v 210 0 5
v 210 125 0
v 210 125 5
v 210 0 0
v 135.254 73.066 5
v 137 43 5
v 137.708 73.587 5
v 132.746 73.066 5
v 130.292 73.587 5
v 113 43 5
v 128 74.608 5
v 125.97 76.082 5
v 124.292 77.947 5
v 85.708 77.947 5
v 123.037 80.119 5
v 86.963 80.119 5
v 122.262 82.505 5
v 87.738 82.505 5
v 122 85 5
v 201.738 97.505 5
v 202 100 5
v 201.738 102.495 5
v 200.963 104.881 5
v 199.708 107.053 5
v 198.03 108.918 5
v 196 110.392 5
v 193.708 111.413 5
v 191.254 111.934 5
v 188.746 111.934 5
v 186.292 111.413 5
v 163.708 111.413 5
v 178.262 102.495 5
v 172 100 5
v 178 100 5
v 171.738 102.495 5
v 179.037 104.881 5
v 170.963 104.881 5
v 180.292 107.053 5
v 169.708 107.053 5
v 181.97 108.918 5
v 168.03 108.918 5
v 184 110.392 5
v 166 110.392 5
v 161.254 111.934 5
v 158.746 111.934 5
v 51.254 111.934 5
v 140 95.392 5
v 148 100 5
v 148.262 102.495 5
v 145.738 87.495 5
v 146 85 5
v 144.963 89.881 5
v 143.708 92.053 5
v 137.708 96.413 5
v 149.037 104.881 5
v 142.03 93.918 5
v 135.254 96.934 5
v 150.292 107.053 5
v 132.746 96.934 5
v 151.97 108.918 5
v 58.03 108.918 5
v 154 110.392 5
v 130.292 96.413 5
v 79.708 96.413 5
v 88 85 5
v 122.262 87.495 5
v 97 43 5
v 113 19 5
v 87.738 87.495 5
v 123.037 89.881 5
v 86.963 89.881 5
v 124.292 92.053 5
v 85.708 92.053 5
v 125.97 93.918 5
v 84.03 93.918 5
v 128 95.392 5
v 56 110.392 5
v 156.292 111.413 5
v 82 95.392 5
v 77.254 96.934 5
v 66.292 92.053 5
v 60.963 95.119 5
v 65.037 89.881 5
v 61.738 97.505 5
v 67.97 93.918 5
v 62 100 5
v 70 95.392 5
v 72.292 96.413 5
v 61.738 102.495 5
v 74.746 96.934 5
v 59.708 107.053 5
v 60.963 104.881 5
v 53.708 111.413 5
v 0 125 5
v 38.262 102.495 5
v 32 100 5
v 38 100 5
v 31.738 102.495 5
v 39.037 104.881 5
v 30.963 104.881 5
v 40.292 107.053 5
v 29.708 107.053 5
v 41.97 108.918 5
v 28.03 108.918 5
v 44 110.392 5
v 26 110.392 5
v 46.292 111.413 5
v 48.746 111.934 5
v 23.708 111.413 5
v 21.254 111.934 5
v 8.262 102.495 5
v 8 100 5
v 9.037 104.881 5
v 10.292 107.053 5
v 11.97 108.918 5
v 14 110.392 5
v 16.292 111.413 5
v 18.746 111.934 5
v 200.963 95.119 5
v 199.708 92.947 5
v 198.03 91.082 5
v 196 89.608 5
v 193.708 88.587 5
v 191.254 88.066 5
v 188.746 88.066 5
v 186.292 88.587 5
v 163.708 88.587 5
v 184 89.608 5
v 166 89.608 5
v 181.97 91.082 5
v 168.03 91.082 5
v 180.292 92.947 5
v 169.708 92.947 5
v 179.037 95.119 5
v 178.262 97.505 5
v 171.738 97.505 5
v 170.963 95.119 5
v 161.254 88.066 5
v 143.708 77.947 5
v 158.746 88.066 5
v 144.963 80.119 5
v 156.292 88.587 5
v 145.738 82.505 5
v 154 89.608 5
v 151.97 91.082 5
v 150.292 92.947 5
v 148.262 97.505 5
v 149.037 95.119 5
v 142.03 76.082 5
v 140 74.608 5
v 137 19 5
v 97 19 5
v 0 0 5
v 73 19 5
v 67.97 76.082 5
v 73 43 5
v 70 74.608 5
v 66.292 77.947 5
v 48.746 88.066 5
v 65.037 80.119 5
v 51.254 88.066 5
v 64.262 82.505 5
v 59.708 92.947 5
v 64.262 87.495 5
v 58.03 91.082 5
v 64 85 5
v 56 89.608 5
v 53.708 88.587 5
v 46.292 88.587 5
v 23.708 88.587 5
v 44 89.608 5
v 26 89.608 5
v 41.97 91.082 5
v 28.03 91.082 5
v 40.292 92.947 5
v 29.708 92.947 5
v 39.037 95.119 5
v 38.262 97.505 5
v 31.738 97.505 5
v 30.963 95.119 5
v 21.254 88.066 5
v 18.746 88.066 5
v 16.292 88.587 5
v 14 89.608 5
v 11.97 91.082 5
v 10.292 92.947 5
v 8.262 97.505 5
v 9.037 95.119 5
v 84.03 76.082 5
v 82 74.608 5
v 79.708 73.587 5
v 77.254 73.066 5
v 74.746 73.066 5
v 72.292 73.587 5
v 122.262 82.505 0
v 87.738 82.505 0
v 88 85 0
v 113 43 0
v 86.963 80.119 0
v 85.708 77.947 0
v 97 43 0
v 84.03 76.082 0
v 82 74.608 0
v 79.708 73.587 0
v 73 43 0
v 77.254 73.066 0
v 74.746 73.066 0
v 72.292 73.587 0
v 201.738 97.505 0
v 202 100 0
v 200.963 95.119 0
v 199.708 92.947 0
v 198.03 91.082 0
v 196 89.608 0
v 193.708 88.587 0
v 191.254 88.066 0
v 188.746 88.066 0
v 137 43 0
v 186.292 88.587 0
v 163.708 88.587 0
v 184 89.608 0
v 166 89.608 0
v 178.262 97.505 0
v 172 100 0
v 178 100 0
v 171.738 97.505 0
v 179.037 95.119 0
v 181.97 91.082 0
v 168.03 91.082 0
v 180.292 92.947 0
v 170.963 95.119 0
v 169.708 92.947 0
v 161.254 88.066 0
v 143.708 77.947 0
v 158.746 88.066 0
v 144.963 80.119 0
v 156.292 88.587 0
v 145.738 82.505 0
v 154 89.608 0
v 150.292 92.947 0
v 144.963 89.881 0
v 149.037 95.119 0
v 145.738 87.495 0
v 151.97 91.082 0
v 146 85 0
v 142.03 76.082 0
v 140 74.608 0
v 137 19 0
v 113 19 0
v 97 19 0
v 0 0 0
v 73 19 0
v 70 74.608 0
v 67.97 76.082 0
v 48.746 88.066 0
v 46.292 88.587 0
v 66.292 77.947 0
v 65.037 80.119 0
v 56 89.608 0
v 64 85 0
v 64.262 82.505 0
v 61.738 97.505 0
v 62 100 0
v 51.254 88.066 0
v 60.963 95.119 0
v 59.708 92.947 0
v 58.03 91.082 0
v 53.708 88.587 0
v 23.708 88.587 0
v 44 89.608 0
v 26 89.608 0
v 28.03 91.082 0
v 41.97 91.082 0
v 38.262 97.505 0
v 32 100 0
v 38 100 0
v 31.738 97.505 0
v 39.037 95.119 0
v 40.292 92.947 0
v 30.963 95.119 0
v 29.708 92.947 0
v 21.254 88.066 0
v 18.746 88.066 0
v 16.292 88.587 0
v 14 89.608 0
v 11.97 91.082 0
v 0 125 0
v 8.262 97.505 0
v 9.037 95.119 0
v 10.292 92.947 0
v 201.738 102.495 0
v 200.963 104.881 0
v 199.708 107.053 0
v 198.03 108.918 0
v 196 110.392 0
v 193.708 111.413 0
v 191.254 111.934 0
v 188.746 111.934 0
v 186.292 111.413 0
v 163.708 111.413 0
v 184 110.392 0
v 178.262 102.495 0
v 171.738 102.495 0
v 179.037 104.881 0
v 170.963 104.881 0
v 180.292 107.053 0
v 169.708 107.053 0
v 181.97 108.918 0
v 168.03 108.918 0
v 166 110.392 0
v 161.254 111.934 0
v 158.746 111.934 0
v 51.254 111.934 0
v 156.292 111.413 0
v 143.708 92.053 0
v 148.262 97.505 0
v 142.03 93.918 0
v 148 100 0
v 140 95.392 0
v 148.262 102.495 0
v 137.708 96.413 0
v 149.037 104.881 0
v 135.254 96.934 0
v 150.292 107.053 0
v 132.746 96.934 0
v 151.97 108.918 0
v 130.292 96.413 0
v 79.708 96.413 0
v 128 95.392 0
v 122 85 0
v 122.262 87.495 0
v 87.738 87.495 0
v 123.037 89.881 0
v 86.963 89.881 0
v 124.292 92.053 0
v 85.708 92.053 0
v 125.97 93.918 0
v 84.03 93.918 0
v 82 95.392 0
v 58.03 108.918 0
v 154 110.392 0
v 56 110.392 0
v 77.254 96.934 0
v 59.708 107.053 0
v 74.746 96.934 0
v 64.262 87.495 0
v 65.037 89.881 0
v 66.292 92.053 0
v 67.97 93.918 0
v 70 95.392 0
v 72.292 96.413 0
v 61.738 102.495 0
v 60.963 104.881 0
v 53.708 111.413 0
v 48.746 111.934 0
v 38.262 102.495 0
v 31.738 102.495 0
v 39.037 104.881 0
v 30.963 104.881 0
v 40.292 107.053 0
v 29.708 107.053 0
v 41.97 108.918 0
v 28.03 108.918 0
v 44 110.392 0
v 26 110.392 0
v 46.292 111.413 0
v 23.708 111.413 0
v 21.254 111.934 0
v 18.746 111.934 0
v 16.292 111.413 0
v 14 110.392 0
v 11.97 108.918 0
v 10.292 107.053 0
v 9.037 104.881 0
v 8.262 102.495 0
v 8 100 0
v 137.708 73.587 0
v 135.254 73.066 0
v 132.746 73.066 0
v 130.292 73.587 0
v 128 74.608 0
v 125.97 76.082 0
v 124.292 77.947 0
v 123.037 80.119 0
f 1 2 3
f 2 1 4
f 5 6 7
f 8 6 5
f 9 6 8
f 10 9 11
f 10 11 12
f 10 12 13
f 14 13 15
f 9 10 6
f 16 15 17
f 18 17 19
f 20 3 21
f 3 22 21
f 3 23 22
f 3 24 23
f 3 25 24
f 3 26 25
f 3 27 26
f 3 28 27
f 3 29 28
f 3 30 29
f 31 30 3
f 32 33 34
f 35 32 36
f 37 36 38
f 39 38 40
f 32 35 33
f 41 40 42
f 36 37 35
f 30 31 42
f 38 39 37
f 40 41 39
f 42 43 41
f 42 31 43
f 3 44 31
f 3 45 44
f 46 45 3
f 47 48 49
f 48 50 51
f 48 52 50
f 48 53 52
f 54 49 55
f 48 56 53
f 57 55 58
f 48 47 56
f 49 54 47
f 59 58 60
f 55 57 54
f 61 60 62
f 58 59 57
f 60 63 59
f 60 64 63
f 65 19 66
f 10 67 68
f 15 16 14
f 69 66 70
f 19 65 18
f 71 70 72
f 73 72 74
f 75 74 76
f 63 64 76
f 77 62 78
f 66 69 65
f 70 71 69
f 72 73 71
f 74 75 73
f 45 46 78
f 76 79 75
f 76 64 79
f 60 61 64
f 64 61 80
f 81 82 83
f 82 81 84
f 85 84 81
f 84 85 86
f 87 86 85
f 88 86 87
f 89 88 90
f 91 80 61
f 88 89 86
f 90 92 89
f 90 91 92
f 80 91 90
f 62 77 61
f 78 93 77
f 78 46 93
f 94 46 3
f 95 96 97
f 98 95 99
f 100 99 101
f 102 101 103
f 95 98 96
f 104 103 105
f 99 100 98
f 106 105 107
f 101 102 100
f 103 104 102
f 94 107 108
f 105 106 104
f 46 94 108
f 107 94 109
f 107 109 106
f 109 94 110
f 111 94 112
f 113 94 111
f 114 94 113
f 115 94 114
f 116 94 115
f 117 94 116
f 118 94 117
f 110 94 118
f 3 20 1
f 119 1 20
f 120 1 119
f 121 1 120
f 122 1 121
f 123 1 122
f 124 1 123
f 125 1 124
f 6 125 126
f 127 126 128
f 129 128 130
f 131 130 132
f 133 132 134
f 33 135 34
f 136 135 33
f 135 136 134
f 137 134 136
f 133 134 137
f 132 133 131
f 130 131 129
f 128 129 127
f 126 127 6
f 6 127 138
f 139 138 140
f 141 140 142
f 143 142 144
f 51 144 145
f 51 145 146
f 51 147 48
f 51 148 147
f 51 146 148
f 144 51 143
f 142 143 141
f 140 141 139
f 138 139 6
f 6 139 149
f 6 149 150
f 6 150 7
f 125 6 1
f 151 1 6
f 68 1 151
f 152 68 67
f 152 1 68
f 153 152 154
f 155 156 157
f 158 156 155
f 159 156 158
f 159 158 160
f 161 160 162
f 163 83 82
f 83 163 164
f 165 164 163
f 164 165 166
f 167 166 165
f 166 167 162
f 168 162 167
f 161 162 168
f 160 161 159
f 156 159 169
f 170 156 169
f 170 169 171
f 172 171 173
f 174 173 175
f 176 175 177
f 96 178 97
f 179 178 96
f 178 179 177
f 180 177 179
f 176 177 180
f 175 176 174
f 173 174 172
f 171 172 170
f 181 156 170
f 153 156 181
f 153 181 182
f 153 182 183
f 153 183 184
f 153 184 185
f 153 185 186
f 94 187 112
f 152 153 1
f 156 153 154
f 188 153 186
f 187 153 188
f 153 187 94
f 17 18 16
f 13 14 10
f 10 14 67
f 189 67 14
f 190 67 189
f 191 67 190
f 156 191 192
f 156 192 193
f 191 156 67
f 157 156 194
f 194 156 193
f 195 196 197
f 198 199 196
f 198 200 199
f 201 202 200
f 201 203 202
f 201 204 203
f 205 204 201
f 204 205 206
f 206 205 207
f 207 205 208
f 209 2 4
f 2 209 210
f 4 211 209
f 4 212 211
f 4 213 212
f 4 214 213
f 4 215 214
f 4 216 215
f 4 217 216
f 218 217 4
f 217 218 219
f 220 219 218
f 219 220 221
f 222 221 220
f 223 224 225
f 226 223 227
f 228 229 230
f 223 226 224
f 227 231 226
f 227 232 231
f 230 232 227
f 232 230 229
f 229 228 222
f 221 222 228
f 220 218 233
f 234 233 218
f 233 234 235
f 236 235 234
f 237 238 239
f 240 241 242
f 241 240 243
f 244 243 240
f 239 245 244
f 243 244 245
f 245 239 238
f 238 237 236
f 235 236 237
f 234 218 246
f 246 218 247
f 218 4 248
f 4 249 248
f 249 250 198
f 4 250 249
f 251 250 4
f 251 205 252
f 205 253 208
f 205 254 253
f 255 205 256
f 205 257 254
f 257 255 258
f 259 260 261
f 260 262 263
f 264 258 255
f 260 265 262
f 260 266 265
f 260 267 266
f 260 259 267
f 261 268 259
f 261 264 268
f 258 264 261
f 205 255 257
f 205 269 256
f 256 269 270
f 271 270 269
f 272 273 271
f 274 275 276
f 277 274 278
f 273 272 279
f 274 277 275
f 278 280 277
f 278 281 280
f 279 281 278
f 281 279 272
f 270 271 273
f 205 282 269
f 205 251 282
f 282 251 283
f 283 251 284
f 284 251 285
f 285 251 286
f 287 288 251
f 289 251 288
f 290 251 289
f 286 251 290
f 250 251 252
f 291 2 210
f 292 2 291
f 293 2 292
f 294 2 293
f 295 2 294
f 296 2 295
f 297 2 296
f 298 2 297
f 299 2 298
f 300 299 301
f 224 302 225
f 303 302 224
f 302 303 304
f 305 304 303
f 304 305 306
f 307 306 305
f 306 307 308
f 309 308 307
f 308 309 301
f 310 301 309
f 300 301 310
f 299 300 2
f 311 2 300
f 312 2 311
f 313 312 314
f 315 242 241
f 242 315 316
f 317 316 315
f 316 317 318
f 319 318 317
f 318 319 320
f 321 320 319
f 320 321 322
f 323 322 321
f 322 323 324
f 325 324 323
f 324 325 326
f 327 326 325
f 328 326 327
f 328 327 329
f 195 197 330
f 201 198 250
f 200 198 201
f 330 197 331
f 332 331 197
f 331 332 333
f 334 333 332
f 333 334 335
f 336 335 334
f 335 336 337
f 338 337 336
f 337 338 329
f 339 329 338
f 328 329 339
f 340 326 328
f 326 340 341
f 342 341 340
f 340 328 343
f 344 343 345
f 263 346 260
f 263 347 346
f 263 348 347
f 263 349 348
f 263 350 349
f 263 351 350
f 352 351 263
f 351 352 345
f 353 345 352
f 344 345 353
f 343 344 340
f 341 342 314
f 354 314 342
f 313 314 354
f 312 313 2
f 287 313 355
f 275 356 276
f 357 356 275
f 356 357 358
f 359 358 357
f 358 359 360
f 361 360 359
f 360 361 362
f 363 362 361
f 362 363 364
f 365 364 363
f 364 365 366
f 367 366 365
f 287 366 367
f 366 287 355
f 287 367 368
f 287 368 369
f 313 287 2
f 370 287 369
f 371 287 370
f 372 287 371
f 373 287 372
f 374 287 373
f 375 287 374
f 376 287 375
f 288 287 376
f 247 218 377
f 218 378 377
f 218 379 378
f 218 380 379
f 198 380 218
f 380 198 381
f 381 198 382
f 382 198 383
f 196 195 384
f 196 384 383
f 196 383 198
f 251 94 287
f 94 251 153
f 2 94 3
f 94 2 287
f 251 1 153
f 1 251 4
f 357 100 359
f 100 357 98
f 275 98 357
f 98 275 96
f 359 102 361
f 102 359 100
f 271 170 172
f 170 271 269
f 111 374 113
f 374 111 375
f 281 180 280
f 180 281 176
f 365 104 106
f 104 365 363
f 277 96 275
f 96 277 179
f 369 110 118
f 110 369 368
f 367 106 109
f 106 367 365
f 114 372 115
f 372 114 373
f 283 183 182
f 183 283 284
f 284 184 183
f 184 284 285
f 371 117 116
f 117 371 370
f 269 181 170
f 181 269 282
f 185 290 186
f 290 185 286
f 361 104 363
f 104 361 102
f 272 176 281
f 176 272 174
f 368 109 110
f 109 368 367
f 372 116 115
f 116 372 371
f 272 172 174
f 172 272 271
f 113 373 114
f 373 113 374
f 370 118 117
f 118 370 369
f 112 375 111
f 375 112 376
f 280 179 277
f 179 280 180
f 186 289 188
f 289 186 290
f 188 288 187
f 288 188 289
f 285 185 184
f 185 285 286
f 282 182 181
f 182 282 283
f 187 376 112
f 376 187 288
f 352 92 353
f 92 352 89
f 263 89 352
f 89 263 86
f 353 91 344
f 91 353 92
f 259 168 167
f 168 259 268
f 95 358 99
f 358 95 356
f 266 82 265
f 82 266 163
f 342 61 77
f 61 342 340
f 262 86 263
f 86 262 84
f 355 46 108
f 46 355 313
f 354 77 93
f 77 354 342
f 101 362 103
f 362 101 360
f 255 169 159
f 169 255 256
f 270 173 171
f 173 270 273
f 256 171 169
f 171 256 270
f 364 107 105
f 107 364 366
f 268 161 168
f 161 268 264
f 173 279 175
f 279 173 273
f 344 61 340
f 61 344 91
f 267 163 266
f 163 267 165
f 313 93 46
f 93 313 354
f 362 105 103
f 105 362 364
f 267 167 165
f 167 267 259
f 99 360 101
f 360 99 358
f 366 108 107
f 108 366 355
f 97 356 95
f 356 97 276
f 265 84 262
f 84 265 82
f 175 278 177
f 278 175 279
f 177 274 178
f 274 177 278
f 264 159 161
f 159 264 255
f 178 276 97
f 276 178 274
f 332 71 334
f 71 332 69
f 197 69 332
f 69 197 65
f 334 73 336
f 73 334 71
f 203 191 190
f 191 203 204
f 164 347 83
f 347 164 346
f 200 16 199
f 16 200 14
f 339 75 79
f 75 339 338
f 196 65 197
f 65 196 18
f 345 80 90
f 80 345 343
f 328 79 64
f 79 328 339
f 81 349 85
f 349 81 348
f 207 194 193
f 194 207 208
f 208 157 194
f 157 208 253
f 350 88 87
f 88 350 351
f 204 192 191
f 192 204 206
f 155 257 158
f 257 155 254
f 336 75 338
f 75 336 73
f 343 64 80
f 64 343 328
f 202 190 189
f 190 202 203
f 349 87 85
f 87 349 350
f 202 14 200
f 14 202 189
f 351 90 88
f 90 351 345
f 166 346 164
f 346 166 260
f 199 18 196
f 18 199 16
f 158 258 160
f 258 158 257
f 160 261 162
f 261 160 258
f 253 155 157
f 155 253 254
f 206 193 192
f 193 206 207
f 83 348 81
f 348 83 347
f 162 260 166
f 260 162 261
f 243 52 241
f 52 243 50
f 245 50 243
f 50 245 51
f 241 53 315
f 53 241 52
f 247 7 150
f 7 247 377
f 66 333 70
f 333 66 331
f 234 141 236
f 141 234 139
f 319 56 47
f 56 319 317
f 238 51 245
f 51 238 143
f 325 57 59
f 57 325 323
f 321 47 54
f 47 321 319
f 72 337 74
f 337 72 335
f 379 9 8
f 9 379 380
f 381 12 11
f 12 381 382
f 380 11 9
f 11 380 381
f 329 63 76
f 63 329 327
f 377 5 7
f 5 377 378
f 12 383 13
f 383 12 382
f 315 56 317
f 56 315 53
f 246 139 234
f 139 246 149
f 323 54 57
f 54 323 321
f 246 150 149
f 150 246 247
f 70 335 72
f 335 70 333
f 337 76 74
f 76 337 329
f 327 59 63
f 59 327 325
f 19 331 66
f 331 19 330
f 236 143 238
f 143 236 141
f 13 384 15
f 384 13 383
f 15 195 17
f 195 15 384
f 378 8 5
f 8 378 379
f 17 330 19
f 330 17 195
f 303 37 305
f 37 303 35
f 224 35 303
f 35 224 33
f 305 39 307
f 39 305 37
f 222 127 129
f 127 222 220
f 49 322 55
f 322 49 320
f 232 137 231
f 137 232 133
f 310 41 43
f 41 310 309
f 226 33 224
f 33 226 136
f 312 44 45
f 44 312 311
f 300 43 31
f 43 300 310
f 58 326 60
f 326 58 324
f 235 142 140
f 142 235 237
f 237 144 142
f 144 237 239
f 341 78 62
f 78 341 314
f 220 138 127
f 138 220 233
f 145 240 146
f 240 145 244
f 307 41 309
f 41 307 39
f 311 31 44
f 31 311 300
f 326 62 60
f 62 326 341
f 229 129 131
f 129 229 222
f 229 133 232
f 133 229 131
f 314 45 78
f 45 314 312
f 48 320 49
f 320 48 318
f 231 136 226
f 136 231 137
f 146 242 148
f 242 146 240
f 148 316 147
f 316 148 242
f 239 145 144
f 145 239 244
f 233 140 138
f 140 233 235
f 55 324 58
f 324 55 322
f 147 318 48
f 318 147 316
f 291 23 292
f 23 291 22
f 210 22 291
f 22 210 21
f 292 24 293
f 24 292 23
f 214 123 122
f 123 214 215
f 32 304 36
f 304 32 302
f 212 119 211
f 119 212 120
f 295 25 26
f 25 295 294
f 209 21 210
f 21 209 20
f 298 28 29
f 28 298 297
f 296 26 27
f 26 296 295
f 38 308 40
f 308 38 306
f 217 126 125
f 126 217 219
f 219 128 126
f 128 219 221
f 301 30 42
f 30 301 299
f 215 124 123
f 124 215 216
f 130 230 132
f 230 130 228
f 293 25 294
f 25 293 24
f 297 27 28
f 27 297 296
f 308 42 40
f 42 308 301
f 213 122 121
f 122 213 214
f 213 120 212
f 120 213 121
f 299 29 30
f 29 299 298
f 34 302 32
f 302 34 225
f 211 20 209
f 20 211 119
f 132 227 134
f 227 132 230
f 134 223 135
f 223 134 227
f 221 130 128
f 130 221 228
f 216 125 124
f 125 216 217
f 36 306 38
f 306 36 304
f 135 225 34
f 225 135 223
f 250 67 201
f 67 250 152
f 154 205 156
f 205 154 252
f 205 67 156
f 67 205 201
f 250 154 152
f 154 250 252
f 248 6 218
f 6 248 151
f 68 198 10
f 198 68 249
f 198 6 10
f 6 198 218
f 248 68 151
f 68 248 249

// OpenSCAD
// Set to MM

// Size 200mm x 100mm x 50mm
// w x d x h

buttonSize = 24;
rowstart = 100;
sidespace = 110;

difference(){
  cube([210, 125, 5]);
    // Left Hand Side
  translate([20,rowstart, 0]) cylinder(r=buttonSize/2,h=100);
  translate([50,rowstart, 0]) cylinder(r=buttonSize/2,h=100);
  translate([76,rowstart - 15, 0]) cylinder(r=buttonSize/2,h=100);
    // Right Hand Side
  translate([24 + sidespace,rowstart - 15, 0]) cylinder(r=buttonSize/2,h=100);
  translate([50 + sidespace,rowstart, 0]) cylinder(r=buttonSize/2,h=100);
  translate([80 + sidespace,rowstart, 0]) cylinder(r=buttonSize/2,h=100);
    // Middle Area
  translate([85 - buttonSize / 2, rowstart - 69 - buttonSize / 2, 0]) cube(buttonSize,h=100);
  translate([15 + sidespace - buttonSize / 2,rowstart - 69 - buttonSize / 2, 0]) cube(buttonSize,h=100);
}
